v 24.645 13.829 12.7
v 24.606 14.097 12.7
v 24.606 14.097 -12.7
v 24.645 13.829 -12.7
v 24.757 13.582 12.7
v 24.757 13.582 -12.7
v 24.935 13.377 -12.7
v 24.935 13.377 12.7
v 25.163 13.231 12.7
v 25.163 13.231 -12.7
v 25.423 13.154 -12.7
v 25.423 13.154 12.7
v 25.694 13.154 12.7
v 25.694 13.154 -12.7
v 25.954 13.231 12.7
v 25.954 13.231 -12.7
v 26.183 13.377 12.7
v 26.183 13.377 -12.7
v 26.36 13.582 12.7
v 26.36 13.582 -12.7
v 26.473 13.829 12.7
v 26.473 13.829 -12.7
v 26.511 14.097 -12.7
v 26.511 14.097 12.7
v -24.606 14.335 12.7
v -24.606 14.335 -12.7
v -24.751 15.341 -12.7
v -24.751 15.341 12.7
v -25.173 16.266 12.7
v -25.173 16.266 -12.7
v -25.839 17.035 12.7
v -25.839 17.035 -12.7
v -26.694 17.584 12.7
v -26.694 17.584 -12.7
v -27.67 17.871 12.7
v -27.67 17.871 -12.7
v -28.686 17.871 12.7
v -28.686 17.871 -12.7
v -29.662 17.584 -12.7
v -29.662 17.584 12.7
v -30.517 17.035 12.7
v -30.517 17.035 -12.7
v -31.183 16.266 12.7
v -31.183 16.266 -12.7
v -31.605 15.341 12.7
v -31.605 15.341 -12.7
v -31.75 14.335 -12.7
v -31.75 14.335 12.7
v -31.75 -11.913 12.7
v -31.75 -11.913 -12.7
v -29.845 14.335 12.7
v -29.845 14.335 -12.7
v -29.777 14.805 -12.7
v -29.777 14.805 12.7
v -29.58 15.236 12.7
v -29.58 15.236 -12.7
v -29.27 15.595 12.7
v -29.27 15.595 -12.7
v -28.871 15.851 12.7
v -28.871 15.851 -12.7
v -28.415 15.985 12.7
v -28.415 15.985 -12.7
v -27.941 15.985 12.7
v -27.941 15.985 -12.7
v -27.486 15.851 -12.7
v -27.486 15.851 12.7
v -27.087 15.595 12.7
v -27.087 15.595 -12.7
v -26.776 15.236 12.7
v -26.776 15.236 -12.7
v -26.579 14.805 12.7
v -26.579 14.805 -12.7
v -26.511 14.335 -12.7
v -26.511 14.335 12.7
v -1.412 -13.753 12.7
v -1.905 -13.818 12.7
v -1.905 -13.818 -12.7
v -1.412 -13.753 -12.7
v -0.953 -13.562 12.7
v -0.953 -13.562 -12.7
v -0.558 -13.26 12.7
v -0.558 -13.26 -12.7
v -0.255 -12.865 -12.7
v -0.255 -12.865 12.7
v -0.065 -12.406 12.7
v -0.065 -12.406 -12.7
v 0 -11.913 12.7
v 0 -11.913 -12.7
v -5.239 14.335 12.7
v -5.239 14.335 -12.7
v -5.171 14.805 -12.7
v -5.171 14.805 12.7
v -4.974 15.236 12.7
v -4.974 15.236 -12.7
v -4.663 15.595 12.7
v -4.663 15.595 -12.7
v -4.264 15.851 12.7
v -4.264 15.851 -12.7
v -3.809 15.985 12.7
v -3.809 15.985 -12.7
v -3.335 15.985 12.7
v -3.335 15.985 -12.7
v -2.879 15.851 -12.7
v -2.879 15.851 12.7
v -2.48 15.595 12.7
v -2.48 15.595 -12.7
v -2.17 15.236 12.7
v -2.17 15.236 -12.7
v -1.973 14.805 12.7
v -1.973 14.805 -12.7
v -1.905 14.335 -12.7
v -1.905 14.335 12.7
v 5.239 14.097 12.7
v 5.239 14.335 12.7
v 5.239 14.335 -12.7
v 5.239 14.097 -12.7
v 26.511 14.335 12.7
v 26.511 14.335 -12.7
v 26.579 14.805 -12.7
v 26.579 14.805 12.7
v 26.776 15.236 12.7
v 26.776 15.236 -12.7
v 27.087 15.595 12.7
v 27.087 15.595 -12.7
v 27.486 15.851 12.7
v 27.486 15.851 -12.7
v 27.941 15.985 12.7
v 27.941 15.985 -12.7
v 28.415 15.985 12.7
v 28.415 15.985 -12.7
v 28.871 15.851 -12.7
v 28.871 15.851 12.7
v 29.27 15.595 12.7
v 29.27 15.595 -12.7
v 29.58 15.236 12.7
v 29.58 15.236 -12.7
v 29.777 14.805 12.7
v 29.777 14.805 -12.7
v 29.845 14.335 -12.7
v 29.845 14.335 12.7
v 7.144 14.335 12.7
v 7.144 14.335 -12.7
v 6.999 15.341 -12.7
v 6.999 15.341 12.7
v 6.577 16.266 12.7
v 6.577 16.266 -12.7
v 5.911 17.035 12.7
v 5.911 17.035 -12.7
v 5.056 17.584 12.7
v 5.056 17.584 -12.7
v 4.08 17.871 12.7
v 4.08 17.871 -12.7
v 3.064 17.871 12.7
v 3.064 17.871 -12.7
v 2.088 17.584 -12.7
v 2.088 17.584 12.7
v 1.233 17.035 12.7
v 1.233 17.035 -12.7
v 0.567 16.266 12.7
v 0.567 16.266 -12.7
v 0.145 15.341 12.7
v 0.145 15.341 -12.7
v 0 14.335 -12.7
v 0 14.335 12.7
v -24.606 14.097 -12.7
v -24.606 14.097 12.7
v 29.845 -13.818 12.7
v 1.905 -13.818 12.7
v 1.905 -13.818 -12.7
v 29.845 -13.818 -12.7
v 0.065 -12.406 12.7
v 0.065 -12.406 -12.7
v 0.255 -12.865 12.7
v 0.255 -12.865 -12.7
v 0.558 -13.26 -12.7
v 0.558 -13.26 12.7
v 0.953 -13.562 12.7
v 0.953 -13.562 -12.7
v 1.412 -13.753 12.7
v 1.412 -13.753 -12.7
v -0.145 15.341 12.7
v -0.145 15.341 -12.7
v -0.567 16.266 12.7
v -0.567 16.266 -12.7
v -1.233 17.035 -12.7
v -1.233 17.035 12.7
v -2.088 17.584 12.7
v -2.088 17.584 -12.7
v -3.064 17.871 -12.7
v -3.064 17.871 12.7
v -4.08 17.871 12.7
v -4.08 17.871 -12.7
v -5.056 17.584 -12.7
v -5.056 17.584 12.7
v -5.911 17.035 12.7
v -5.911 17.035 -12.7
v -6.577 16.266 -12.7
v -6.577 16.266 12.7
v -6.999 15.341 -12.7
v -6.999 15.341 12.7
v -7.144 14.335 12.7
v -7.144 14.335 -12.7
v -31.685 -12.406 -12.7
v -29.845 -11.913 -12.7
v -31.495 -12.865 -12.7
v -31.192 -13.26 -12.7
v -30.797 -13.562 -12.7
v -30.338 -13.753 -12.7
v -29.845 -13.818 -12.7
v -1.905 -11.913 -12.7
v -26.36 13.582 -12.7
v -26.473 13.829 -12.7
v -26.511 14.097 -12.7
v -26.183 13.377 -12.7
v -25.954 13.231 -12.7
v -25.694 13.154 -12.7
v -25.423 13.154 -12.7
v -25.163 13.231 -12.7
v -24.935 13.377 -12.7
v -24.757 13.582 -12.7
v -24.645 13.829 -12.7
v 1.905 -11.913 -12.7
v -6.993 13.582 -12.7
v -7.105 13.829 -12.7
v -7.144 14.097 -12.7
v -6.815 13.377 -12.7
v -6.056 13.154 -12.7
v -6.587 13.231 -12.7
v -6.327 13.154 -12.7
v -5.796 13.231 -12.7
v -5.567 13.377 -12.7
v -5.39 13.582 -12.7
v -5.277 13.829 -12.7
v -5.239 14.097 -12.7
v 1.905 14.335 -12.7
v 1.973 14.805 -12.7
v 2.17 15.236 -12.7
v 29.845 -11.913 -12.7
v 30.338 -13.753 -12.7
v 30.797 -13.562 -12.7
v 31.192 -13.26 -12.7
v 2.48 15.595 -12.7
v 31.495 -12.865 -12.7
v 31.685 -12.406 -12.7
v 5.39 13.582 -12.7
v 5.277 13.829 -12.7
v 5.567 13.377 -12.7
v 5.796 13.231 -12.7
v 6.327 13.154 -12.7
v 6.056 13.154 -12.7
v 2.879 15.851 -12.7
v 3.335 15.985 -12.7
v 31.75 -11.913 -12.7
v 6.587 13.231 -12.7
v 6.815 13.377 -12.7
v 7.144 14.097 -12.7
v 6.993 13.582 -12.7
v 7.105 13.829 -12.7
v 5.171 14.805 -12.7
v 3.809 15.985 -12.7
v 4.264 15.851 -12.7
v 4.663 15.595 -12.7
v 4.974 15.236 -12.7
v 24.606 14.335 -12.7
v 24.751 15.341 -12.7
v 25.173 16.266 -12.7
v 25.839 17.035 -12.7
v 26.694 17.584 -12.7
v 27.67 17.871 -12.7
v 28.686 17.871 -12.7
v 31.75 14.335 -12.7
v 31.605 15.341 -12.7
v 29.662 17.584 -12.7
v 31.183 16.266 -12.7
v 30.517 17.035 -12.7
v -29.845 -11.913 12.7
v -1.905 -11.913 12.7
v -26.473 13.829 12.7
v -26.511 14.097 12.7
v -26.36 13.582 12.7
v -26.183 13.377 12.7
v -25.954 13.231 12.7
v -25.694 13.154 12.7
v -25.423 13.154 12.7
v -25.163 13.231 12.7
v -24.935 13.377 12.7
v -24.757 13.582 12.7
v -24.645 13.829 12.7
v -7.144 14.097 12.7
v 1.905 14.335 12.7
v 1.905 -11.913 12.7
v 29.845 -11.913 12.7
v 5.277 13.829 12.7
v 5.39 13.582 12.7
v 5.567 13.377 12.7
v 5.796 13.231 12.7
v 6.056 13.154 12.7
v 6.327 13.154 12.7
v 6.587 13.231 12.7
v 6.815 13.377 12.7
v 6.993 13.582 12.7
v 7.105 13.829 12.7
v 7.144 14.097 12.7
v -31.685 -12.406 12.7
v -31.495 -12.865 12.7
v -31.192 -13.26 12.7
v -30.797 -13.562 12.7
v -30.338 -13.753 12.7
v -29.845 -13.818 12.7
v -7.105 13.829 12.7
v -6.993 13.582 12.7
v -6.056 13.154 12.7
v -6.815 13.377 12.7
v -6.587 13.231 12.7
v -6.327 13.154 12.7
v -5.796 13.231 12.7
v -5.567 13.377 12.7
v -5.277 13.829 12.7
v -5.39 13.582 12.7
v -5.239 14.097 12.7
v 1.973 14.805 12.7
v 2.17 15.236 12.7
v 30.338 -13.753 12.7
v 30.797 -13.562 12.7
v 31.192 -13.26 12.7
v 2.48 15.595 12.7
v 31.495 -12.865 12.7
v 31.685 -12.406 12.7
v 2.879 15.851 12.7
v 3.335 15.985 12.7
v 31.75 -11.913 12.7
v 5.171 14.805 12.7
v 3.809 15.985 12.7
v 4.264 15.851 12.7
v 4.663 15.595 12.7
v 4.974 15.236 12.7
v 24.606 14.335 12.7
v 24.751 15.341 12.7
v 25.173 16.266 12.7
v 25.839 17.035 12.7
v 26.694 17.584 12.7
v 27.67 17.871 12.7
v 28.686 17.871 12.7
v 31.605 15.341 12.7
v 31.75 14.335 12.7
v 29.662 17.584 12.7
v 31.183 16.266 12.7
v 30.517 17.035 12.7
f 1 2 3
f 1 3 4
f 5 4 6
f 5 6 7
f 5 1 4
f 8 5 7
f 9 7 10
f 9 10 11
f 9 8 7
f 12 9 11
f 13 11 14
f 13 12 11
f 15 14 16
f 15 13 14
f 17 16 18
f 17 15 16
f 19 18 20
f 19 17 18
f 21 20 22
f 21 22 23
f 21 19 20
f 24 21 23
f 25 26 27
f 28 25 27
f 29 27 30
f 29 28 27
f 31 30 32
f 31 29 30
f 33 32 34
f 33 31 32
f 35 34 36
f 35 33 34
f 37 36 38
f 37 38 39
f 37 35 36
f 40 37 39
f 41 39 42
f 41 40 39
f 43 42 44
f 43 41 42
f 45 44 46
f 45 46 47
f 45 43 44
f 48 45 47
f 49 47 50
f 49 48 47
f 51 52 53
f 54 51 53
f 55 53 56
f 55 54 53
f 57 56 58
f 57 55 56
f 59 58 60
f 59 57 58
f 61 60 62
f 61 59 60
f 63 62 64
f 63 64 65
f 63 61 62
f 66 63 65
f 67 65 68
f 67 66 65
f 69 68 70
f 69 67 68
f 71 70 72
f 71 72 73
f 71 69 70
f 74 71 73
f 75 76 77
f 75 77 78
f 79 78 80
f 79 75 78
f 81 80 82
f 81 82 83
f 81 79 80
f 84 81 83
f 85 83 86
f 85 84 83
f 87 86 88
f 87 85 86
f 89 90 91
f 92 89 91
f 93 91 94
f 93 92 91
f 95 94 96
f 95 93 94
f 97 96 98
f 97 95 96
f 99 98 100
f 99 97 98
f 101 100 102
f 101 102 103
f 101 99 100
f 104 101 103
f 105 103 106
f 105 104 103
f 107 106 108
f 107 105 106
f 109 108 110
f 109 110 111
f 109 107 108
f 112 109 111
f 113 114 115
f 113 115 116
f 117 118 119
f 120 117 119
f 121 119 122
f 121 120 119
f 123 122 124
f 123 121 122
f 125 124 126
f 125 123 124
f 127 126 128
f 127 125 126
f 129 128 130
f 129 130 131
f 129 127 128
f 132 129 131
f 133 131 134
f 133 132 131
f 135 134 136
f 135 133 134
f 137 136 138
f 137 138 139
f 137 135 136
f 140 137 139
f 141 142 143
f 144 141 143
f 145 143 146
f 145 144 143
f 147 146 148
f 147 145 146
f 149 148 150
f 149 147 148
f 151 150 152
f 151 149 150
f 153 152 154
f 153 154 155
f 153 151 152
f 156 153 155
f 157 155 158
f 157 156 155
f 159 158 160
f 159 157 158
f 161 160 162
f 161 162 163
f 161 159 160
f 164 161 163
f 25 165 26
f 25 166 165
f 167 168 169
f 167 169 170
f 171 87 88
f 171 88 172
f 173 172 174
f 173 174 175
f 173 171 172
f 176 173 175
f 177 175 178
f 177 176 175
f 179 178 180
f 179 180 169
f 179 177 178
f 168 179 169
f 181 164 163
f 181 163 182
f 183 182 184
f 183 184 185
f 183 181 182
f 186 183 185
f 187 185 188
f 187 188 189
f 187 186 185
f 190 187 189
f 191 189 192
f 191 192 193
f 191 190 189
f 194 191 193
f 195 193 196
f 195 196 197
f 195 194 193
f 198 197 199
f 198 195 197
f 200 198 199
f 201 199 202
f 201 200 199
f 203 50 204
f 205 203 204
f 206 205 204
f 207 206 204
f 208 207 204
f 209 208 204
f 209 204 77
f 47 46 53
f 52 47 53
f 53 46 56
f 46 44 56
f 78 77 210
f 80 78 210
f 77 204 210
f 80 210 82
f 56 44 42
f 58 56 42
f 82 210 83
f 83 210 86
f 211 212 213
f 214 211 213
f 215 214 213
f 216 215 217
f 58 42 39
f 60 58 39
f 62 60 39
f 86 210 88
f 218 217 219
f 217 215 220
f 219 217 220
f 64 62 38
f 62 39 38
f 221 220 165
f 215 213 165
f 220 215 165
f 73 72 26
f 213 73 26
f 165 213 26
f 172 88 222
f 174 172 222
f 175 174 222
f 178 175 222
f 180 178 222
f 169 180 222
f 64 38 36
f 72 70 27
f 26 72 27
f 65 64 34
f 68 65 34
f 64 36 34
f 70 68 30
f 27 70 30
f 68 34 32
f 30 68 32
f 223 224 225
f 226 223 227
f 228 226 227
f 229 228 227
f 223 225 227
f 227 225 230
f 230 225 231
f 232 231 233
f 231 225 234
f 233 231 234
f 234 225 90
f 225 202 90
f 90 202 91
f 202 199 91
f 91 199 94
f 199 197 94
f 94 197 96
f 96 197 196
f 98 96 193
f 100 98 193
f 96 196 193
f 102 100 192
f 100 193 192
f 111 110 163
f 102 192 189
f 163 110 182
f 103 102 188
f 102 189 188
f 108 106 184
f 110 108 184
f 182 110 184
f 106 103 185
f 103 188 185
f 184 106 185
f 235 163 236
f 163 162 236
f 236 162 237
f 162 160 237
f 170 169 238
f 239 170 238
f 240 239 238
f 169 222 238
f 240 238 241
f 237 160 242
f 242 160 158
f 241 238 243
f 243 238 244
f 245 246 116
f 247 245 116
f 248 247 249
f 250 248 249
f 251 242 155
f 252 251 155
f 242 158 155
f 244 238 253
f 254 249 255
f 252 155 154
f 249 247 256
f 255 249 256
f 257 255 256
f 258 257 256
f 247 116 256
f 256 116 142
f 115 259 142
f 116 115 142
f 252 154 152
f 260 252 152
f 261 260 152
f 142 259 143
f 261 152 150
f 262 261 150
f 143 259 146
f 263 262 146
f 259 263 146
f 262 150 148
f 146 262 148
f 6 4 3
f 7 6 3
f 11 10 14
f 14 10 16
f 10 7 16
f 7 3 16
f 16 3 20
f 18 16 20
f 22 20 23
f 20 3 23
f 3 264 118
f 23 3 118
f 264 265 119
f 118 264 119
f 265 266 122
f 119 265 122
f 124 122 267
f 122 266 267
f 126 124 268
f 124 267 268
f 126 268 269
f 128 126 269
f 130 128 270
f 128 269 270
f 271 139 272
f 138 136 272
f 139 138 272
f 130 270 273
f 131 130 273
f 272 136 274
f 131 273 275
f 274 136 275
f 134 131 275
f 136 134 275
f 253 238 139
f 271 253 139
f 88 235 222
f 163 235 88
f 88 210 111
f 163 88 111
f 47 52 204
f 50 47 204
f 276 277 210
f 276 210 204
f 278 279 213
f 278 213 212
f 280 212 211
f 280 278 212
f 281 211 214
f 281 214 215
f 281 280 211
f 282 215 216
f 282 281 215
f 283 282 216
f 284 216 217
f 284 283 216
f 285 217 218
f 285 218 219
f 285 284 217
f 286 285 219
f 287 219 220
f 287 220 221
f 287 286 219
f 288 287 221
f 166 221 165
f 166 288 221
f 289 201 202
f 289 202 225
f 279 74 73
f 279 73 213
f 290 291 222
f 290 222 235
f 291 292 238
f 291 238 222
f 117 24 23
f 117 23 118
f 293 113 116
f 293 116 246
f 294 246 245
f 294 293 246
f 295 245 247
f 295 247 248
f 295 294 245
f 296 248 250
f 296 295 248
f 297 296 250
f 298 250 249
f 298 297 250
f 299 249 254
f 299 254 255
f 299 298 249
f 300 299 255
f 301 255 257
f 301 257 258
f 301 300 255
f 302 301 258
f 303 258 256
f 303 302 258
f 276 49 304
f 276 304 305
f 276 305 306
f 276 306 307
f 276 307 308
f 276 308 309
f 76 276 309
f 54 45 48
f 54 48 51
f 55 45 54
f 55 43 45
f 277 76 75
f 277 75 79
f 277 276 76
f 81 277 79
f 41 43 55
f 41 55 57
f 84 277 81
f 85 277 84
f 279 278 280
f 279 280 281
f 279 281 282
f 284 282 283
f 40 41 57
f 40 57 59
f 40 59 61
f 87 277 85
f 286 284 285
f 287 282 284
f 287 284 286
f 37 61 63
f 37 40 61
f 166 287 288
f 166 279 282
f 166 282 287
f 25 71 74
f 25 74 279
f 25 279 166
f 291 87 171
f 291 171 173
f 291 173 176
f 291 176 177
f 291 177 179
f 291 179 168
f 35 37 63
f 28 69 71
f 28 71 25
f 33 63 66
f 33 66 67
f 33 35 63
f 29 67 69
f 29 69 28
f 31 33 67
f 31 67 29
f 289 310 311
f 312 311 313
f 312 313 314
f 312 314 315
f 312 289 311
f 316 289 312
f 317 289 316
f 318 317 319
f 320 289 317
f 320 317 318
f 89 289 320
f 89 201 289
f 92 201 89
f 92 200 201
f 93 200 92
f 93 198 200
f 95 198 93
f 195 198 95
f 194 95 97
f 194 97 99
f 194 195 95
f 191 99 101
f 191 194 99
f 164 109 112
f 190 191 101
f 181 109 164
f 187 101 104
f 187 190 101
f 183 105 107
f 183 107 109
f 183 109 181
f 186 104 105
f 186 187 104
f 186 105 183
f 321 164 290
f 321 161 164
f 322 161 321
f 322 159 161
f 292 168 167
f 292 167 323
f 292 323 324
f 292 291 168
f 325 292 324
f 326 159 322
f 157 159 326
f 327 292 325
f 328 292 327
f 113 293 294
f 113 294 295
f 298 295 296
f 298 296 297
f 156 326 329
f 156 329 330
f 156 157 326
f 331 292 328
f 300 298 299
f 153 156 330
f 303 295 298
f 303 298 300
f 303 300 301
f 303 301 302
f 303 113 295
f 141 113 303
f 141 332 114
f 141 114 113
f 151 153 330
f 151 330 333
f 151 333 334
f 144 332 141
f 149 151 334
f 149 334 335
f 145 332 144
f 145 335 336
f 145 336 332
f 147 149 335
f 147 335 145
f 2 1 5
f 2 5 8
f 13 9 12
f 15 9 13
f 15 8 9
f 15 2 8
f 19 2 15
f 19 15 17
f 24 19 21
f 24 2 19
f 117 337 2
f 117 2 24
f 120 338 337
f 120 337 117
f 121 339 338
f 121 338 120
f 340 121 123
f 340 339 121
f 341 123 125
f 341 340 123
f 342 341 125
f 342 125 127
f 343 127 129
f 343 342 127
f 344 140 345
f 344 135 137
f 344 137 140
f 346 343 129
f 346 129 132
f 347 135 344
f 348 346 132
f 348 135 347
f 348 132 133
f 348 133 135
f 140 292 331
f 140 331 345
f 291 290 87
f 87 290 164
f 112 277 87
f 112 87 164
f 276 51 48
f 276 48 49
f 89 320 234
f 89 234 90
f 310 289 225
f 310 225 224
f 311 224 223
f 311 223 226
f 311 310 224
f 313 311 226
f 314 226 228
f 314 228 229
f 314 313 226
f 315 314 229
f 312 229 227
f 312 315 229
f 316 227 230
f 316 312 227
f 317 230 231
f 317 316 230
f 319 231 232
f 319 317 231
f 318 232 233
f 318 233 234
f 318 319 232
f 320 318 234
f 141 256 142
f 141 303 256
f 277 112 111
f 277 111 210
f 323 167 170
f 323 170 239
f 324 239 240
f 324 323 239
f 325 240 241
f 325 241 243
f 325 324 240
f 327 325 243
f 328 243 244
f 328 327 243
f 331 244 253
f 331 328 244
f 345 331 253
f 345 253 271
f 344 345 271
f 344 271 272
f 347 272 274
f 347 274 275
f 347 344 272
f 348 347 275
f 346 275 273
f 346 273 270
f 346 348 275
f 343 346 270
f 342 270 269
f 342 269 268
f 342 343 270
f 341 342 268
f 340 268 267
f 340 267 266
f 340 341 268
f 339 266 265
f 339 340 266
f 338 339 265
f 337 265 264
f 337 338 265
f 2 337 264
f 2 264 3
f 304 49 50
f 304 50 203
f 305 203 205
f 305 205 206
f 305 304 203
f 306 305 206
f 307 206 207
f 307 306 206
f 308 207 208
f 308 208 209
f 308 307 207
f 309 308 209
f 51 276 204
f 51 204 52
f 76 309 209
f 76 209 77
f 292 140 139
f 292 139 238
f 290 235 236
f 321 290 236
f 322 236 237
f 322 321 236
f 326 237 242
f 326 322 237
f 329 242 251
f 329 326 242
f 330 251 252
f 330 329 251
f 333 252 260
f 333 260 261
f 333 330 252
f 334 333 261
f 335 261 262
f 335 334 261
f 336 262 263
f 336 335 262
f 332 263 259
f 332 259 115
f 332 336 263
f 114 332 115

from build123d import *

# Parameters (mm, degrees)
BASE_EXTRUDE_DEPTH = 12.7
LPATTERN1_COUNT    = 2
LPATTERN1_PITCH    = 31.75


with BuildPart() as part:
    # Sketch1 → Base-Extrude (new, symmetric)
    with BuildSketch(Plane.XY):
        with BuildLine():
            Line((-31.75, 14.335125), (-31.75, -11.9126))
            ThreePointArc((-31.75, -11.9126), (-31.192038418, -13.259638418), (-29.845, -13.8176))
            Line((-29.845, -13.8176), (-1.905, -13.8176))
            ThreePointArc((-1.905, -13.8176), (-0.557961582, -13.259638418), (0, -11.9126))
            Line((0, -11.9126), (0, 14.335125))
            ThreePointArc((0, 14.335125), (-3.571875, 17.907), (-7.14375, 14.335125))
            Line((-7.14375, 14.335125), (-7.14375, 14.097))
            ThreePointArc((-7.14375, 14.097), (-6.19125, 13.1445), (-5.23875, 14.097))
            Line((-5.23875, 14.097), (-5.23875, 14.335125))
            ThreePointArc((-5.23875, 14.335125), (-3.571875, 16.002), (-1.905, 14.335125))
            Line((-1.905, 14.335125), (-1.905, -11.9126))
            Line((-1.905, -11.9126), (-29.845, -11.9126))
            Line((-29.845, -11.9126), (-29.845, 14.335125))
            ThreePointArc((-29.845, 14.335125), (-28.178125, 16.002), (-26.51125, 14.335125))
            Line((-26.51125, 14.335125), (-26.51125, 14.097))
            ThreePointArc((-26.51125, 14.097), (-25.55875, 13.1445), (-24.60625, 14.097))
            Line((-24.60625, 14.097), (-24.60625, 14.335125))
            ThreePointArc((-24.60625, 14.335125), (-28.178125, 17.907), (-31.75, 14.335125))
        make_face()
    base_extrude = extrude(amount=BASE_EXTRUDE_DEPTH, both=True)

    # LPattern1: Base-Extrude ×2
    with Locations(*[(i * LPATTERN1_PITCH, 0, 0) for i in range(1, LPATTERN1_COUNT)]):
        add(base_extrude)


solid = part.part
